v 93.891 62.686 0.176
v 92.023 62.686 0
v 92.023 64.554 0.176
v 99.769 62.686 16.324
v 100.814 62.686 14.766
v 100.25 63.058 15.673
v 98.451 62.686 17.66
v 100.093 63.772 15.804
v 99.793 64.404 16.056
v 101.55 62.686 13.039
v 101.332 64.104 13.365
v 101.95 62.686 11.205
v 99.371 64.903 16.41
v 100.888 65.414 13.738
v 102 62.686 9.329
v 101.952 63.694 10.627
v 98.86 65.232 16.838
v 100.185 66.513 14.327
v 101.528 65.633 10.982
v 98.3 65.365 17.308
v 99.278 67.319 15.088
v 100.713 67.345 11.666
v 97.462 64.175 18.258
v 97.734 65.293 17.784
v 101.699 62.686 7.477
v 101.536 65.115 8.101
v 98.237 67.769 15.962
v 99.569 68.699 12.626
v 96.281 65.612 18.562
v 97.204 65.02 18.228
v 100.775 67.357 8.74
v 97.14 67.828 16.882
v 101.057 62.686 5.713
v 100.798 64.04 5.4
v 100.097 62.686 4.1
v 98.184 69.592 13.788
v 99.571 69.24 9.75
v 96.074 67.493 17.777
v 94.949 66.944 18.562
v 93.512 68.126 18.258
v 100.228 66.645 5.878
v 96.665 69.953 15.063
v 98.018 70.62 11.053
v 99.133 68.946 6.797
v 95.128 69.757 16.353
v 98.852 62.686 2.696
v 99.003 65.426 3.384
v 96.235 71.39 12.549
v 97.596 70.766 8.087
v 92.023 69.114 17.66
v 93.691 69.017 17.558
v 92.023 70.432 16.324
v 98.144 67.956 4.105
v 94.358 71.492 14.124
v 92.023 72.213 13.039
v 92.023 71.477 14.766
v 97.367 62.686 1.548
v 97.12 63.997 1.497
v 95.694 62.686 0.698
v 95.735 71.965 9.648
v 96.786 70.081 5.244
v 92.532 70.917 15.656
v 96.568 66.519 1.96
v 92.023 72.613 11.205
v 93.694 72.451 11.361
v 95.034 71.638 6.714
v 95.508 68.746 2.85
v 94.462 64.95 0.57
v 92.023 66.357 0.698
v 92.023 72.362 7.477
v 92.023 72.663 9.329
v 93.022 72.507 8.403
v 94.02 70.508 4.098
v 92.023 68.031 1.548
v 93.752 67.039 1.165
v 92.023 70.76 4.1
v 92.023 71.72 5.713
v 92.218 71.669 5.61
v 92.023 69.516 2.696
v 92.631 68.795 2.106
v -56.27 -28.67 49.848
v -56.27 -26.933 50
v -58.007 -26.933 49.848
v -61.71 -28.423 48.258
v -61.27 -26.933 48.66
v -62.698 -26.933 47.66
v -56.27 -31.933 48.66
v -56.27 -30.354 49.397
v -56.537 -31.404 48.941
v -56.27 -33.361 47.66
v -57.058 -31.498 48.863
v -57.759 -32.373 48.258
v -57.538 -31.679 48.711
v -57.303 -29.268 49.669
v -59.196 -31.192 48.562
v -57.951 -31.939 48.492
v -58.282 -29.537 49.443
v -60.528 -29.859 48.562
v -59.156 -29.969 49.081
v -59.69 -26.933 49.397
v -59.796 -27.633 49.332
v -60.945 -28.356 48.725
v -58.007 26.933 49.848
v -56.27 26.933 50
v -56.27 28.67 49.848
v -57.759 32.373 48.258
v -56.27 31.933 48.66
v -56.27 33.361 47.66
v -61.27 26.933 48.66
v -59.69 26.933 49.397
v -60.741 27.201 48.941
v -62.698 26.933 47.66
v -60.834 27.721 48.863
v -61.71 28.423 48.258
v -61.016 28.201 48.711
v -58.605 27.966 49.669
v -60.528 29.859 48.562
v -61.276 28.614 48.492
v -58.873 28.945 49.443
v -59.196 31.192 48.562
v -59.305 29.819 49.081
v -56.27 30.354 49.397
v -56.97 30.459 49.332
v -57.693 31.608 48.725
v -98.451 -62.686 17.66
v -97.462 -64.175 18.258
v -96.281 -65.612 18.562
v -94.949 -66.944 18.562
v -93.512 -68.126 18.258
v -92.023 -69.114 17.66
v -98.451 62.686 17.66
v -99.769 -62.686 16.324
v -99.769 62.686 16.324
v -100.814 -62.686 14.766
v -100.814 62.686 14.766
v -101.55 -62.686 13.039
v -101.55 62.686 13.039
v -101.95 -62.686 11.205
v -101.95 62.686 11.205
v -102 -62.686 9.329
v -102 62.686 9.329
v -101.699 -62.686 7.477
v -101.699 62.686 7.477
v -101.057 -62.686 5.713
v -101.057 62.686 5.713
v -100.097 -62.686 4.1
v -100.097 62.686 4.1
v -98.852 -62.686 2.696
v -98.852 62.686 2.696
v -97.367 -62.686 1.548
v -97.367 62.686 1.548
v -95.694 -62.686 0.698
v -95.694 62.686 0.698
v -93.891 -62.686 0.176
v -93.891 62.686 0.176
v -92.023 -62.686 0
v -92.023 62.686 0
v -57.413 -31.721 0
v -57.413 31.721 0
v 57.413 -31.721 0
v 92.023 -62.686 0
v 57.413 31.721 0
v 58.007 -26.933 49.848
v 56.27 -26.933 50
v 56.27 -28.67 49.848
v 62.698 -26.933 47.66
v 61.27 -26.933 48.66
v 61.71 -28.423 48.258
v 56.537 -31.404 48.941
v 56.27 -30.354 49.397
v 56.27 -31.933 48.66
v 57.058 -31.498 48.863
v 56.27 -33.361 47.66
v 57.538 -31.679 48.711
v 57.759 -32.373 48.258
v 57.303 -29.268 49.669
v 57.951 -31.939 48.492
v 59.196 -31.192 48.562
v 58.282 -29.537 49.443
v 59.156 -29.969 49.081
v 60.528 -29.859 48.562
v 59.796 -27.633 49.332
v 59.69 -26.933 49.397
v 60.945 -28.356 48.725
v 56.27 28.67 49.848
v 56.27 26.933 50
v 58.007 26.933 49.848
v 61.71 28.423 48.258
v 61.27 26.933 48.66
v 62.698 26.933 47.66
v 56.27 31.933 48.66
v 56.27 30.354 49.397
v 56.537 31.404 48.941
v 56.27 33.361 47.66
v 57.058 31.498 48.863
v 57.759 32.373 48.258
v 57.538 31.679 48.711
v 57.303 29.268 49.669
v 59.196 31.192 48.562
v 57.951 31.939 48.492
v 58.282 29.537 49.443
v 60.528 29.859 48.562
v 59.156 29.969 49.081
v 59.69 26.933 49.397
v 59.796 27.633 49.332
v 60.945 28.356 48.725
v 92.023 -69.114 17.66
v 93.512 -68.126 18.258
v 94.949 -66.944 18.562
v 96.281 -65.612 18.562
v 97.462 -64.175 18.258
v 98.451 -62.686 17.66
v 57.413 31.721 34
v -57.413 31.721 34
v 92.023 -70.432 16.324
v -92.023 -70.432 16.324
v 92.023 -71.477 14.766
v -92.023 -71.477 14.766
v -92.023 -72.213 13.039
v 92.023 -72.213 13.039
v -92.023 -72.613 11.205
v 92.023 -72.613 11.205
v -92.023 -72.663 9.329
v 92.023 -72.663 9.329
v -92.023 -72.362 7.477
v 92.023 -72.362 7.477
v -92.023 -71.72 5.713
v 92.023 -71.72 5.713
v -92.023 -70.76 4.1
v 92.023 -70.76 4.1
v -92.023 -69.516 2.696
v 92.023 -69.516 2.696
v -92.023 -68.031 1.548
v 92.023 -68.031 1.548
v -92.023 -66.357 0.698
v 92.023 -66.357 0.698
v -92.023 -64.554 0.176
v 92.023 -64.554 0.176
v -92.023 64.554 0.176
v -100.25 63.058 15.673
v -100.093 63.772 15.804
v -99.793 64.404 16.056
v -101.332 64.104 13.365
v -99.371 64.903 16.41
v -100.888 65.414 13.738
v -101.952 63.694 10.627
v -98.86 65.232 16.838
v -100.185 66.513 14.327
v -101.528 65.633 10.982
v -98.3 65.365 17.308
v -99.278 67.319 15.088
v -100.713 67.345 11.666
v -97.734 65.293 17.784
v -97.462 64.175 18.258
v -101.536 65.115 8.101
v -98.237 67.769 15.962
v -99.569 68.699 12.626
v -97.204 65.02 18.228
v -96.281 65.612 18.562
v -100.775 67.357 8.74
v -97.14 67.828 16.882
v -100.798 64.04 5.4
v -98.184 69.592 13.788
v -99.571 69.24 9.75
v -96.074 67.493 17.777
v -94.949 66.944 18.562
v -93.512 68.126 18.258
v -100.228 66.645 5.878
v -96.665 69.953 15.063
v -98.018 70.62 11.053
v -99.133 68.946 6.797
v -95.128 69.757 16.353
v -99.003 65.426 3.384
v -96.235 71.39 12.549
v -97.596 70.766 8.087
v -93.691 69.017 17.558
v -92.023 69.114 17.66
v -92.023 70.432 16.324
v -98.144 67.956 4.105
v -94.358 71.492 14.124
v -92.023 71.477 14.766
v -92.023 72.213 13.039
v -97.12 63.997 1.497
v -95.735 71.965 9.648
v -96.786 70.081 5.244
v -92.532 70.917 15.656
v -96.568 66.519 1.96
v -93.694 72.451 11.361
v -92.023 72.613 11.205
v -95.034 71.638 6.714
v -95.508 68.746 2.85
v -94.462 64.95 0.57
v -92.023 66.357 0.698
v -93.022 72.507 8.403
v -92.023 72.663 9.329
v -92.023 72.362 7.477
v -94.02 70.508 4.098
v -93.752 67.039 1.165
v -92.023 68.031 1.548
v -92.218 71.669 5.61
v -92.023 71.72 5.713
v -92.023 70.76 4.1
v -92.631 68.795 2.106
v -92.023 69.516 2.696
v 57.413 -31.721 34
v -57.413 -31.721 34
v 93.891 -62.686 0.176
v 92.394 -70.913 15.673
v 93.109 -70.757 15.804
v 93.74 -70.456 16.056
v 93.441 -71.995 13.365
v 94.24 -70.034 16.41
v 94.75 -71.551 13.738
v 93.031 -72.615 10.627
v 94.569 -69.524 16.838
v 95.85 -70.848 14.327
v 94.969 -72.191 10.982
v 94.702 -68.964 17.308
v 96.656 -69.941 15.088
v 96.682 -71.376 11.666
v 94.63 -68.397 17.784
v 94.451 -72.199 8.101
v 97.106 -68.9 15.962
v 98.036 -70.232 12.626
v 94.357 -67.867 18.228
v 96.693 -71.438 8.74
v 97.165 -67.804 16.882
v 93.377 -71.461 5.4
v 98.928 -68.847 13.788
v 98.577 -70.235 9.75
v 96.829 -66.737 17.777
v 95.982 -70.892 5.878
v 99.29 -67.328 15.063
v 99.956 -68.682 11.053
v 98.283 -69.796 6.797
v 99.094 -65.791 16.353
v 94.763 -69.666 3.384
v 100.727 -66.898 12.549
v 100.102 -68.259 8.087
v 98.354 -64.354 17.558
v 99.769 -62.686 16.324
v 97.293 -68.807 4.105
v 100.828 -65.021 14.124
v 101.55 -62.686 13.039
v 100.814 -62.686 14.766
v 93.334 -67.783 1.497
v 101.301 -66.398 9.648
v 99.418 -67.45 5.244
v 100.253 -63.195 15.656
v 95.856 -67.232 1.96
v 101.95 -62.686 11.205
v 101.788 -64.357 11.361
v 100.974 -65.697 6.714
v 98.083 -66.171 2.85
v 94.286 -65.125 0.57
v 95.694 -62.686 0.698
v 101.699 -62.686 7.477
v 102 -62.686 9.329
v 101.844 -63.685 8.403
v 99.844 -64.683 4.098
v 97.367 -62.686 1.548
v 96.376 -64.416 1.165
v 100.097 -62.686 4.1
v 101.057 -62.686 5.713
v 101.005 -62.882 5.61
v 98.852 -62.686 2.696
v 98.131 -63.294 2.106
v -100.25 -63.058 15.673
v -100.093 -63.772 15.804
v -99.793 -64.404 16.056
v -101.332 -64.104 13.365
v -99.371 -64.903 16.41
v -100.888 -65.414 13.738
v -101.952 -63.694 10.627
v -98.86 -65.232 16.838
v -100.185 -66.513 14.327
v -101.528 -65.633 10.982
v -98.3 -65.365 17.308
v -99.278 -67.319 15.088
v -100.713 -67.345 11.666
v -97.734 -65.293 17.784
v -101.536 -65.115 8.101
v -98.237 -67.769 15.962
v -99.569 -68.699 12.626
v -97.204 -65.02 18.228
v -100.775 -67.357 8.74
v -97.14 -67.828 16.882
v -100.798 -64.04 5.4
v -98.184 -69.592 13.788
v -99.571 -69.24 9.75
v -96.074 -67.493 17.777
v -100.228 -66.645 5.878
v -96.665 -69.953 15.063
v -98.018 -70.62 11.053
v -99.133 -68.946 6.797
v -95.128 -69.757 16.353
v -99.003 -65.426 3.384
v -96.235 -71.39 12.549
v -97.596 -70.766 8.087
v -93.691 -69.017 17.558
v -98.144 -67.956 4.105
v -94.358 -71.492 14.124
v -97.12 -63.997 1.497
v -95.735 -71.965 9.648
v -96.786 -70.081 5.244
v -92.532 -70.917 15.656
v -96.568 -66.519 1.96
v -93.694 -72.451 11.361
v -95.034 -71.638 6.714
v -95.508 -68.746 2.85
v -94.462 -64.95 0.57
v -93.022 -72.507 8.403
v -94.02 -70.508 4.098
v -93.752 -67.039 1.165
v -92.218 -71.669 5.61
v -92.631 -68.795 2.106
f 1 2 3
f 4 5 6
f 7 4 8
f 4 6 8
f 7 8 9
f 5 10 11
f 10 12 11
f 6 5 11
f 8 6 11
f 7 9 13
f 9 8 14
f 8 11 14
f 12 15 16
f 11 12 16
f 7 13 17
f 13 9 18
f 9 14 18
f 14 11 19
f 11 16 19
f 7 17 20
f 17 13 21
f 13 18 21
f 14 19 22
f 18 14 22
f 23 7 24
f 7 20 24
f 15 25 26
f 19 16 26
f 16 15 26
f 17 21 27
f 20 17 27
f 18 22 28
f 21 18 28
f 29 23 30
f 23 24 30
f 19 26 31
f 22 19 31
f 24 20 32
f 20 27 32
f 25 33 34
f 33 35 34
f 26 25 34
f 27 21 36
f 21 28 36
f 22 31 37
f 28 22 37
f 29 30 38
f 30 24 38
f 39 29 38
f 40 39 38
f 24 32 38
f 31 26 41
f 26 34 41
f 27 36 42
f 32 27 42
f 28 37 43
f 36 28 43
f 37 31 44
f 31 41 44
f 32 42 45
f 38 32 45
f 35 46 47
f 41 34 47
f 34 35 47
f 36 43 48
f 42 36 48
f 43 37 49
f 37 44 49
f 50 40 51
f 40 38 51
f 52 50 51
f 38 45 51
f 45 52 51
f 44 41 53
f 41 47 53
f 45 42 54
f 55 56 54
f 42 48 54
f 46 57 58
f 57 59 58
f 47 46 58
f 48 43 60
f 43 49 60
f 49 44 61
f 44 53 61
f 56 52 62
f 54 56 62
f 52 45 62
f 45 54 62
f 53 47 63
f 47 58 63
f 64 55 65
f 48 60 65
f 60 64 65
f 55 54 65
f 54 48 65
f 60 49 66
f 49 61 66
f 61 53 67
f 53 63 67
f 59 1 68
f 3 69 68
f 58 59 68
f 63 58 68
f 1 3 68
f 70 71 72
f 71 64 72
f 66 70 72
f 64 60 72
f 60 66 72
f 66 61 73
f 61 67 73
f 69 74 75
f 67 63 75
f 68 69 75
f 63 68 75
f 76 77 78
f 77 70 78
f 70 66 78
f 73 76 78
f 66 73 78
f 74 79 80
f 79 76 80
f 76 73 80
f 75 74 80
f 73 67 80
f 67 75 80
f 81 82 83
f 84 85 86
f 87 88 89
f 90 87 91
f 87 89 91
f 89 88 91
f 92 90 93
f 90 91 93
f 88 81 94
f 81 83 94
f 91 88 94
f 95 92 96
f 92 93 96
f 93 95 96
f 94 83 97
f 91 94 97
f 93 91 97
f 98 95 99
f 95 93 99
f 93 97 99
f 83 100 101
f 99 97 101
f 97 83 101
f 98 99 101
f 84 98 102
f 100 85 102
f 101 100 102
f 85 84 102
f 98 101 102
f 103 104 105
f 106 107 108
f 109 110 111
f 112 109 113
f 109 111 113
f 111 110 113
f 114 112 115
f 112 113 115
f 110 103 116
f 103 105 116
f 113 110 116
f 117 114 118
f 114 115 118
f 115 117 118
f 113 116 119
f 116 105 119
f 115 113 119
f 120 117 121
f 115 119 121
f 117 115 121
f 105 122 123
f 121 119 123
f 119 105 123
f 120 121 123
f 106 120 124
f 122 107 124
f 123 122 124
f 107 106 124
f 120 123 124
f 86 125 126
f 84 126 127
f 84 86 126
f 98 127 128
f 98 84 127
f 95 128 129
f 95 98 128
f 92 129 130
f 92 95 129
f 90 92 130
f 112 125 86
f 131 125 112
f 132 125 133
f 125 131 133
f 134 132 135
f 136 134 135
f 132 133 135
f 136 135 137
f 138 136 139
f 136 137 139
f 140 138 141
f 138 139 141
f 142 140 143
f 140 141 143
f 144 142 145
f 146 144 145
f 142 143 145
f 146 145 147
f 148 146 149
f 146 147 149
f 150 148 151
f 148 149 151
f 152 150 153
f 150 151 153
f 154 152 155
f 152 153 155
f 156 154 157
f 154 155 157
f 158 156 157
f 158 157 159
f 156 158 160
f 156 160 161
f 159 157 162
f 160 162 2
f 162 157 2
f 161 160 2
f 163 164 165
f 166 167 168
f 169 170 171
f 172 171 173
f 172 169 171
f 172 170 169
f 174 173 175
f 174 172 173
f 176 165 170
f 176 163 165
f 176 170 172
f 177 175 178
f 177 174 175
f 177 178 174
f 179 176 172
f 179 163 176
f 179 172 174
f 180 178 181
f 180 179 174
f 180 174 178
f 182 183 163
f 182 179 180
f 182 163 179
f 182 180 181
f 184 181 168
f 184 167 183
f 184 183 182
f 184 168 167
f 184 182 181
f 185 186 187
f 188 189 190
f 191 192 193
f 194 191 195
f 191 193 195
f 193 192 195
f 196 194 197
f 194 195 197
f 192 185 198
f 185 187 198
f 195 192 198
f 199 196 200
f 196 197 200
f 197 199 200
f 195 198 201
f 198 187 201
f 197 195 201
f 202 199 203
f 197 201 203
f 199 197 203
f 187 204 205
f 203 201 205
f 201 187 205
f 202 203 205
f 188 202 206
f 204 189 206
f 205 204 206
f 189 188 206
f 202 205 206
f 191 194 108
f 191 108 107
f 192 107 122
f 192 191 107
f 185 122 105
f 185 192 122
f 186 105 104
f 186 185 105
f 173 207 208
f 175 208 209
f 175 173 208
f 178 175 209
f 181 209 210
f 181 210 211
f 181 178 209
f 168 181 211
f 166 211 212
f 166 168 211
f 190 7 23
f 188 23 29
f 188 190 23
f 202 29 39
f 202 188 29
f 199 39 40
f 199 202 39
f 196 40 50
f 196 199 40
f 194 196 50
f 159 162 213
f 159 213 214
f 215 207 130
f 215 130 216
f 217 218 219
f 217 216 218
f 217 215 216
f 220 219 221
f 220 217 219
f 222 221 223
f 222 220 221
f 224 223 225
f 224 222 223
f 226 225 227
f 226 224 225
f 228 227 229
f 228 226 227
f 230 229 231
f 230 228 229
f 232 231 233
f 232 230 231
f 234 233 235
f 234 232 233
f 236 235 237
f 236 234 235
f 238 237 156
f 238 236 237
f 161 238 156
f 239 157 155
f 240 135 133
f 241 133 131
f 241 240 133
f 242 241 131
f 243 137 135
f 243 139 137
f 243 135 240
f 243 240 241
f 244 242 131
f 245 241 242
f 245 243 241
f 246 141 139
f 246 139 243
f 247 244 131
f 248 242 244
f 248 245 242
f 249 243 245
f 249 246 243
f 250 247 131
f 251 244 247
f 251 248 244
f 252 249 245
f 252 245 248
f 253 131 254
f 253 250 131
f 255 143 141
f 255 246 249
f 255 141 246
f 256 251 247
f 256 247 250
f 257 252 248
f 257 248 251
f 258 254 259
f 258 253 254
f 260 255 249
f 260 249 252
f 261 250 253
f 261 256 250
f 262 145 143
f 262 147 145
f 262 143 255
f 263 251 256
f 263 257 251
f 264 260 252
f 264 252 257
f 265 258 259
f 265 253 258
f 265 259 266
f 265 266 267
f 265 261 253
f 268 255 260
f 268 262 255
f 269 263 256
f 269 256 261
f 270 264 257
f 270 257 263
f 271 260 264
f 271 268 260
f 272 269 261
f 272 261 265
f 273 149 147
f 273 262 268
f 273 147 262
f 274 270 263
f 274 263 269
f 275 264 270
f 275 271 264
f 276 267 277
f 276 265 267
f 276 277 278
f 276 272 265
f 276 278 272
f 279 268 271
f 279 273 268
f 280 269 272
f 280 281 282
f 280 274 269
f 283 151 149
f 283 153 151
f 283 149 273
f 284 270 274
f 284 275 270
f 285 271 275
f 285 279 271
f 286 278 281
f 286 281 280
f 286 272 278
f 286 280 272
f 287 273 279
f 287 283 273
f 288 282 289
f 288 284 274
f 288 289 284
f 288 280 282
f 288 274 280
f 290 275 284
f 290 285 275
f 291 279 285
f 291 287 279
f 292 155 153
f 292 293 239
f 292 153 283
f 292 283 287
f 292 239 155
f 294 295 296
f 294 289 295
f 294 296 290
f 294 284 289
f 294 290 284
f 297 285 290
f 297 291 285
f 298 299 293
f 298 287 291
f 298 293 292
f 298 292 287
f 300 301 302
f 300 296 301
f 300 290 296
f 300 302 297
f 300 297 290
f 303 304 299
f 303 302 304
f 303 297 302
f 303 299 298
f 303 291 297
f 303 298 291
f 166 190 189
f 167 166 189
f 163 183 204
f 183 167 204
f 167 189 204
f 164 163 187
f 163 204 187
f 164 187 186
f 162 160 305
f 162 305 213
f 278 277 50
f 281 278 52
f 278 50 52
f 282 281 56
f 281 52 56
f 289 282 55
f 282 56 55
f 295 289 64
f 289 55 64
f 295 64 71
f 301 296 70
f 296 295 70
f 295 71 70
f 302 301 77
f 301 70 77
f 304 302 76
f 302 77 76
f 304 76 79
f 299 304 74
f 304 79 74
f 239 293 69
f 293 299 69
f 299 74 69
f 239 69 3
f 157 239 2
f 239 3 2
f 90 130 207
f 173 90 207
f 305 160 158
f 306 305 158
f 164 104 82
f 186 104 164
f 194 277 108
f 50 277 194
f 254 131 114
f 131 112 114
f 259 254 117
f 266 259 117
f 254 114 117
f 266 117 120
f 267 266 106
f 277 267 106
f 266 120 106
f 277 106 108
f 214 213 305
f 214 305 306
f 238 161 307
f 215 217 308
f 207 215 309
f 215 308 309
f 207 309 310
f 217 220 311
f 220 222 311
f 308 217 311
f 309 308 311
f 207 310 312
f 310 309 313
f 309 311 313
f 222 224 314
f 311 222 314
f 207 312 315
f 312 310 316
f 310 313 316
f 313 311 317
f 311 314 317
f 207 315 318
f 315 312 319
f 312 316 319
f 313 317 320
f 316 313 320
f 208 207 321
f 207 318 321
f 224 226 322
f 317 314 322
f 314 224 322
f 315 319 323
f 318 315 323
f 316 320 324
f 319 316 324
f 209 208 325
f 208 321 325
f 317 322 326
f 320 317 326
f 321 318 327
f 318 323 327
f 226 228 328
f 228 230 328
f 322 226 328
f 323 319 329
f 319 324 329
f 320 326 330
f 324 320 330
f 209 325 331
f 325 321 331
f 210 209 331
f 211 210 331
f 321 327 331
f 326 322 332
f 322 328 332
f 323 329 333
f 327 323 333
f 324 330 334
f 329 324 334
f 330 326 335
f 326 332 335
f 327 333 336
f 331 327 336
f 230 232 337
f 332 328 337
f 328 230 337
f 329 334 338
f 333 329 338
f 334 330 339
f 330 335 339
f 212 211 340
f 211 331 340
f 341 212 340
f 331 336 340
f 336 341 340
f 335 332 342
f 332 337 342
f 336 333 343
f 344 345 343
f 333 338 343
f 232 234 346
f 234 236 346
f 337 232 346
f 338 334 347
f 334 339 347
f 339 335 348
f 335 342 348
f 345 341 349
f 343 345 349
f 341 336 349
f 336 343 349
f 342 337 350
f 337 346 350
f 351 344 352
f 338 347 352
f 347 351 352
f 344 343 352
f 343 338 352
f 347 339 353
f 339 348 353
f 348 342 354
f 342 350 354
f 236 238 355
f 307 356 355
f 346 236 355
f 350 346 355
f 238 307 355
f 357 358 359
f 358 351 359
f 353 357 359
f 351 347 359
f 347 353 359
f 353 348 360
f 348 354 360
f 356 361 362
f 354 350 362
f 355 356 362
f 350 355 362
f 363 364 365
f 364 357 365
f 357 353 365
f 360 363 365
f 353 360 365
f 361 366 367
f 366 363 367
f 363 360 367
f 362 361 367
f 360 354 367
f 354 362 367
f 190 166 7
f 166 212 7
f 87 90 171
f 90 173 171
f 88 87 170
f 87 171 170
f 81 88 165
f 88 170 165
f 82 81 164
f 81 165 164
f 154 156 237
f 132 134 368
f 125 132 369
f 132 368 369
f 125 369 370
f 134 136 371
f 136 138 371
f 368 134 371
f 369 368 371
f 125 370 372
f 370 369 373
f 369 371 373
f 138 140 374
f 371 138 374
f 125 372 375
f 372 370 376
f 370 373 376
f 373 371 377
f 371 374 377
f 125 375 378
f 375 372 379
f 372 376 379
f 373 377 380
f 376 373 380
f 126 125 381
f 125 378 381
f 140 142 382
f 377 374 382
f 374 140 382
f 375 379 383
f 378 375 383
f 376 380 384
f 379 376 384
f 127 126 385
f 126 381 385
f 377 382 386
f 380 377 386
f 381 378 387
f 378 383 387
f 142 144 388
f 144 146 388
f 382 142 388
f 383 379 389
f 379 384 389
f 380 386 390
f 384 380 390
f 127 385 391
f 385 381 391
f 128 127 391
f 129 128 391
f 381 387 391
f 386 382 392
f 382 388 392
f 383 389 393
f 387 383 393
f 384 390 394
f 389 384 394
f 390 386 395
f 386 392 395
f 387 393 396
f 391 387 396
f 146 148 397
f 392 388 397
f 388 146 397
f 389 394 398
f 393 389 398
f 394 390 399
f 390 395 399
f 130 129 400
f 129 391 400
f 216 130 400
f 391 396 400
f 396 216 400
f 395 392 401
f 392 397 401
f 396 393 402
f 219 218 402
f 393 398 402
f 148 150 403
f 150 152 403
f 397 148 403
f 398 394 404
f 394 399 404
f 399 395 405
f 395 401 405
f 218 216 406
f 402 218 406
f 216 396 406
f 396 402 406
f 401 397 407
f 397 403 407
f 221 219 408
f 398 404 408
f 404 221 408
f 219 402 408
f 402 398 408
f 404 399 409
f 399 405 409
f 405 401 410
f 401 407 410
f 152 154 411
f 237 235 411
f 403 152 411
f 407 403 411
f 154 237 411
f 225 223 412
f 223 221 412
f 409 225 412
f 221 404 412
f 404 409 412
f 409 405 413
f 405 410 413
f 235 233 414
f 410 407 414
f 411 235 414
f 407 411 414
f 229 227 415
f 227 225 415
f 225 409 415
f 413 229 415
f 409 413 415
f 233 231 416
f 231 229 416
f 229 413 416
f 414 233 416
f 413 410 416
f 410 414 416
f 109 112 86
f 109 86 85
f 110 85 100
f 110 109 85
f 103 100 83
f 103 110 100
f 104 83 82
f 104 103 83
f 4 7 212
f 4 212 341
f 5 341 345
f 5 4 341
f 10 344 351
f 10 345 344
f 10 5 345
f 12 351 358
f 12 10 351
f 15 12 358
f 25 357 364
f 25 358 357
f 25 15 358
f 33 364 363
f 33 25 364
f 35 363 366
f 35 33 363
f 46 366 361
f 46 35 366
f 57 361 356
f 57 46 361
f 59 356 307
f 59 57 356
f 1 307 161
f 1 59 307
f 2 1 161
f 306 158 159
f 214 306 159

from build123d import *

# Parameters (mm, degrees)
SKETCH_1_W          = 119.8195585
SKETCH_1_H          = 61.146113558
EXTRUDE_1_DEPTH     = 50
DRAFT_8_ANGLE       = 50
FILLET_1_R          = 10
SKETCH_2_W          = 114.826849908
SKETCH_2_H          = 63.442671994
CUT_EXTRUDE_1_DEPTH = 34


with BuildPart() as part:
    # 草图1 → 凸台-拉伸1 (new body)
    with BuildSketch(Plane.XY):
        Rectangle(SKETCH_1_W, SKETCH_1_H)
    extrude(amount=EXTRUDE_1_DEPTH)

    # 拔模8
    draft_8_faces = [part.faces().sort_by_distance(p)[0] for p in [
        (-59.90977925, 0, 25),
        (0, -30.573056779, 25),
        (59.90977925, 0, 25),
        (0, 30.573056779, 25),
    ]]
    draft(draft_8_faces, Plane.XY.offset(50), DRAFT_8_ANGLE)

    # 圆角1
    fillet_1_edges = [part.edges().sort_by_distance(p)[0] for p in [
        (59.90977925, 0, 50),
        (0, 30.573056779, 50),
        (-59.90977925, 0, 50),
        (0, 90.160736408, 0),
        (119.49745888, 0, 0),
        (0, -90.160736408, 0),
        (-119.49745888, 0, 0),
        (0, -30.573056779, 50),
        (-89.703619065, 60.366896593, 25),
        (89.703619065, 60.366896593, 25),
        (89.703619065, -60.366896593, 25),
        (-89.703619065, -60.366896593, 25),
    ]]
    fillet(fillet_1_edges, radius=FILLET_1_R)

    # 草图2 → 切除-拉伸1 (cut)
    with BuildSketch(Plane(origin=(0, 0, 0), x_dir=(-1, 0, 0), z_dir=(0, 0, -1))):
        Rectangle(SKETCH_2_W, SKETCH_2_H)
    extrude(amount=-CUT_EXTRUDE_1_DEPTH, mode=Mode.SUBTRACT)


solid = part.part
